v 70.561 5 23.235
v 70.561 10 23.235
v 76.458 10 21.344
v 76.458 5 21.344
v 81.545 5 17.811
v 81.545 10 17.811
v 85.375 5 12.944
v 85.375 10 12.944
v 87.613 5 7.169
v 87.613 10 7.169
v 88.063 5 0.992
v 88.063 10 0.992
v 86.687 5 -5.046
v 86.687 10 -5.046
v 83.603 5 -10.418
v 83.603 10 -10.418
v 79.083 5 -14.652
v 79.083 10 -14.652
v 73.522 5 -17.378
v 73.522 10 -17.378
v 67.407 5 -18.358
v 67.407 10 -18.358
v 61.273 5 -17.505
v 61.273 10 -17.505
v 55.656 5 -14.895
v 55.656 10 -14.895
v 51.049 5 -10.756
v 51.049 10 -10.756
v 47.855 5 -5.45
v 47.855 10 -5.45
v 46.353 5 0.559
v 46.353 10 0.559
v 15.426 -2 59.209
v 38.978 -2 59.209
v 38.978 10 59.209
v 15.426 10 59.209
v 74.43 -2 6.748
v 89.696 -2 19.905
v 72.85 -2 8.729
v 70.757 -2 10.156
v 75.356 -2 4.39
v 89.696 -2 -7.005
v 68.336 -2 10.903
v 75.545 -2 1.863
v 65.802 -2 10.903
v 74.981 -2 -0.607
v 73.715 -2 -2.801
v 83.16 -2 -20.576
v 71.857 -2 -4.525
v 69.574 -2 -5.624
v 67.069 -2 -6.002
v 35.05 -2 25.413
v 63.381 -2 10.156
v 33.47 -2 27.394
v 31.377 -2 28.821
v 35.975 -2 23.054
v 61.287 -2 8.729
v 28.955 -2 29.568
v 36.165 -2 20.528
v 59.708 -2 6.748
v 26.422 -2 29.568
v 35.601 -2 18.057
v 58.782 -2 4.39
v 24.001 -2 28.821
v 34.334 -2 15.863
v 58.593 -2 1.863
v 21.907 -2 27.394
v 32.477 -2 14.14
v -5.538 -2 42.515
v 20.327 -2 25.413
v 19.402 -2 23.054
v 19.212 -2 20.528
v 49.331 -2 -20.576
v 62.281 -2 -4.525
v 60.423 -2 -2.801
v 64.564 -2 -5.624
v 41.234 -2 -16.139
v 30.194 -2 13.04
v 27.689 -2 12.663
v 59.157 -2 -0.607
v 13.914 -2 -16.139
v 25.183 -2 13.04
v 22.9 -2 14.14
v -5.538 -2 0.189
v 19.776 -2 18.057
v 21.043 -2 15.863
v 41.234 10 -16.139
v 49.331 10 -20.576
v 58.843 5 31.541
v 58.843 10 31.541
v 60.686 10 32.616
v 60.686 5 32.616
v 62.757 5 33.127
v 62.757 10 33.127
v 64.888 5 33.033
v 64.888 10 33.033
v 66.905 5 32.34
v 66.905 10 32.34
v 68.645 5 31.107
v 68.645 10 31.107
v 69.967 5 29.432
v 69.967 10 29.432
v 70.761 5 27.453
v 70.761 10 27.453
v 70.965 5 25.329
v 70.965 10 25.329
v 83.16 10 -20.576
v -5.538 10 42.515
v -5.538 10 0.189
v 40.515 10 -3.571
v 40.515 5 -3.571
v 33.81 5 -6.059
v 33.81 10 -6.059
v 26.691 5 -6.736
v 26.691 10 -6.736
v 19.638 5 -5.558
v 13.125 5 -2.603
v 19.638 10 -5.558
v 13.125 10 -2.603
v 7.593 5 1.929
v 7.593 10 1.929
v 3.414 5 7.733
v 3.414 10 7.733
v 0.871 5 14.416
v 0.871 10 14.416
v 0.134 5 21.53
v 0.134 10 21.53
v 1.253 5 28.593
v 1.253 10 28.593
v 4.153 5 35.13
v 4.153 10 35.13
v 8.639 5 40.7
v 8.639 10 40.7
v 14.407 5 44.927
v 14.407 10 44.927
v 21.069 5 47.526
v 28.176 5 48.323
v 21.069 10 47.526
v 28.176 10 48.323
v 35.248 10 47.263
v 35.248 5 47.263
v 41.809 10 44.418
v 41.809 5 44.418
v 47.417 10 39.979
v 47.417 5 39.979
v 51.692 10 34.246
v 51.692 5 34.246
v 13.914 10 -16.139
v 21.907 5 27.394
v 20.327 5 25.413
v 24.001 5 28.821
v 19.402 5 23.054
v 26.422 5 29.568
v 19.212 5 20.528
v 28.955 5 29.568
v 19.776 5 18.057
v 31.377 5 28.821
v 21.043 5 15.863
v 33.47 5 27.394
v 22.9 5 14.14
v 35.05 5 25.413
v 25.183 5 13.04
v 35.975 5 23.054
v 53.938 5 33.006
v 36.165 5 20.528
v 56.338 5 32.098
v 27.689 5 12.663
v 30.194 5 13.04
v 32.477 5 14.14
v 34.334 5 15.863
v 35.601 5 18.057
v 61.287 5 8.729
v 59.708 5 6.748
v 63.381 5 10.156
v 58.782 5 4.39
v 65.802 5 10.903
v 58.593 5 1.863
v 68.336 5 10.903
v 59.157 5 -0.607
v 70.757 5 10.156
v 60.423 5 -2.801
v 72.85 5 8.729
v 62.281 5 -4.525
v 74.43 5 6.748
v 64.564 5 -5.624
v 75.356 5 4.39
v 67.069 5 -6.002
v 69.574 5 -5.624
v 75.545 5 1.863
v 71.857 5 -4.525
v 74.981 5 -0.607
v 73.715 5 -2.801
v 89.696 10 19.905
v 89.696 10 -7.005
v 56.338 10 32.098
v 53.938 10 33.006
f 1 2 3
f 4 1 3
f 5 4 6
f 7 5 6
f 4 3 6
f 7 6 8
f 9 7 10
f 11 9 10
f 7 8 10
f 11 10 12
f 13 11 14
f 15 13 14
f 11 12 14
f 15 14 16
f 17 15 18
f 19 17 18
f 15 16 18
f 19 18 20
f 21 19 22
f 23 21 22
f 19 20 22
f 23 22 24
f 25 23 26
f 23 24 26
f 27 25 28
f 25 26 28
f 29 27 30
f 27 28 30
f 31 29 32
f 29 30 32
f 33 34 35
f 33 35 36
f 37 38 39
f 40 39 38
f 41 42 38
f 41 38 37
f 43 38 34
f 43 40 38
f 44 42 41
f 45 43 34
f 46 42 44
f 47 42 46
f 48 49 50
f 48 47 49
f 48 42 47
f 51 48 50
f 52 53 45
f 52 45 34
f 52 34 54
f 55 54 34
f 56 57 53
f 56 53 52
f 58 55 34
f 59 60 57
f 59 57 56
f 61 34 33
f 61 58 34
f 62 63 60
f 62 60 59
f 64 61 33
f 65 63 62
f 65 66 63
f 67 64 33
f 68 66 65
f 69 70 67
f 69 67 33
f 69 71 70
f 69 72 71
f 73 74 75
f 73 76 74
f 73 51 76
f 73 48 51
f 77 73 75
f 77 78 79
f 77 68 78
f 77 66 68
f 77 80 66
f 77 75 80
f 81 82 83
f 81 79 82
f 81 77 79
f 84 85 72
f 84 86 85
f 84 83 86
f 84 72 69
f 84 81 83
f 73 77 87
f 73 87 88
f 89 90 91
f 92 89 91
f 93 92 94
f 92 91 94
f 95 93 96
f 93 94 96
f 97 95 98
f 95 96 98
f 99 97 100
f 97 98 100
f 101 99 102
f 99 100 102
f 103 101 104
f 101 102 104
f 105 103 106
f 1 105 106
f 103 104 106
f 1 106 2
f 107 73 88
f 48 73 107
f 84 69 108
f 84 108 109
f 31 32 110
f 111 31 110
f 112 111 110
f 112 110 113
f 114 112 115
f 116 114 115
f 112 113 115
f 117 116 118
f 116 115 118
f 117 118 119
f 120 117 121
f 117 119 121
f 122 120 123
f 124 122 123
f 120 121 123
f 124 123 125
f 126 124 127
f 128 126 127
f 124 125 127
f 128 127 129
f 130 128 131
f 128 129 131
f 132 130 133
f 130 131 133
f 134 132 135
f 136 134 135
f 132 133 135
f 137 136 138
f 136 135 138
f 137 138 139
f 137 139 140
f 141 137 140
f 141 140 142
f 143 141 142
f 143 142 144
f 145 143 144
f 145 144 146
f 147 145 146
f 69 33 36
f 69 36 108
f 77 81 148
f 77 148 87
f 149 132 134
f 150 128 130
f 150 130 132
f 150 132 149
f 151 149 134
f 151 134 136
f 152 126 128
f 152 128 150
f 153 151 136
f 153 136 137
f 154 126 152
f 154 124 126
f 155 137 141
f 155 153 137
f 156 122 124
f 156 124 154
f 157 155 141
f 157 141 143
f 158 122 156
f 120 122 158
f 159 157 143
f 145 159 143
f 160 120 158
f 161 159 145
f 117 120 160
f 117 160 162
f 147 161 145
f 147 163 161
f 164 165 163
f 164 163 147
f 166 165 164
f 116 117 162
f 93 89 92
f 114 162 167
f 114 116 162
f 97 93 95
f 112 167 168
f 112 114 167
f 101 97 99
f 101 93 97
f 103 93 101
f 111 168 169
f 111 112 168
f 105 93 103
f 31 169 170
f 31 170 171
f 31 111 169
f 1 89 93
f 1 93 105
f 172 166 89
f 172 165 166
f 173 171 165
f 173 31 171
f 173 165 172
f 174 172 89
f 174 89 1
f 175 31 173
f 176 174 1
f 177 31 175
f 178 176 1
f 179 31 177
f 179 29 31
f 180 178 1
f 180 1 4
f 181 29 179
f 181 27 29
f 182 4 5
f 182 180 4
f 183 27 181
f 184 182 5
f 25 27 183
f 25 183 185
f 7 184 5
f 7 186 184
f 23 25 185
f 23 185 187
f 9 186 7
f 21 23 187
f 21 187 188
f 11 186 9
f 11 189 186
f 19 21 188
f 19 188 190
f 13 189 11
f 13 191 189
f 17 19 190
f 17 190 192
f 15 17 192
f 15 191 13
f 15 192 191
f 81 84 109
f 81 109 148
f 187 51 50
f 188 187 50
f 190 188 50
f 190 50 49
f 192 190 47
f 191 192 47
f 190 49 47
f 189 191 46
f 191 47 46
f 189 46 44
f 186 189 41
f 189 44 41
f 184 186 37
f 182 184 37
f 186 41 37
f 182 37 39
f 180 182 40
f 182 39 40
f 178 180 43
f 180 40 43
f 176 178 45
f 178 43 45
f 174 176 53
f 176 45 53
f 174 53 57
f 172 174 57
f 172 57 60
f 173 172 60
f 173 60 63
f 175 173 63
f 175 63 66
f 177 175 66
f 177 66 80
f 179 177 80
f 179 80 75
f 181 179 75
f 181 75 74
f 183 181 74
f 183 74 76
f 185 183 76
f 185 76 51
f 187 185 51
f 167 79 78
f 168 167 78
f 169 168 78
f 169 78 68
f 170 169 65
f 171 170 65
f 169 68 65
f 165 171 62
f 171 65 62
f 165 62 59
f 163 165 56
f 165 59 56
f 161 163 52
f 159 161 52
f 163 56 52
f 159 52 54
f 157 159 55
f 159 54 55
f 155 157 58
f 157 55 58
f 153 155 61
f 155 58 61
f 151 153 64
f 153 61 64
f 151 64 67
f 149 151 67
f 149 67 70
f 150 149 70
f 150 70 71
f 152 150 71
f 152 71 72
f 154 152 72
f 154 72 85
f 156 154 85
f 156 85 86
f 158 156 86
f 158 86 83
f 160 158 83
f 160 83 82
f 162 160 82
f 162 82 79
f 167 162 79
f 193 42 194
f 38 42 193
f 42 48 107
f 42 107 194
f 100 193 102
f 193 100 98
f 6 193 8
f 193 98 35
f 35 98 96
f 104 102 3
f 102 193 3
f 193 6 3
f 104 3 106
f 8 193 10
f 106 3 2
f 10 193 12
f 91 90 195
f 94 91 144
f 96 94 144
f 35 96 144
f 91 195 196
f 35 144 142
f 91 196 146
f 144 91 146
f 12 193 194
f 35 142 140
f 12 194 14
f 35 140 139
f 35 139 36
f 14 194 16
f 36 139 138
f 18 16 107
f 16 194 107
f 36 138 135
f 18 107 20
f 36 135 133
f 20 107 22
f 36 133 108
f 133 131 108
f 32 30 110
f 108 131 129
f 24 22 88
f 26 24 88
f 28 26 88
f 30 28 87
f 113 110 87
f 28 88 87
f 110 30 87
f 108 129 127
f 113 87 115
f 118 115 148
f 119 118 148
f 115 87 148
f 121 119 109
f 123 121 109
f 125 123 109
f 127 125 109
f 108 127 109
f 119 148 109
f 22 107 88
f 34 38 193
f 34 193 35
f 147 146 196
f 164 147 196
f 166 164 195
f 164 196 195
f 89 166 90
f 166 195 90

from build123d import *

# Parameters (mm, degrees)
EXTRUDE_START       = -2
EXTRUDE_1_DEPTH     = 12
CUT_EXTRUDE_1_DEPTH = 5
SKETCH_4_R          = 8.5
CUT_EXTRUDE_2_DEPTH = 109.143461437


with BuildPart() as part:
    # Эскиз1 → Вытянуть1 (new body)
    with BuildSketch(Plane(origin=(0, 0, 0), x_dir=(1, 0, 0), z_dir=(0, 1, 0)).offset(EXTRUDE_START)):
        Polygon((41.234335961, 16.139303033), (49.33132622, 20.576367476), (83.159652077, 20.576367476), (89.695898477, 7.004834382), (89.695898477, -19.904859962), (38.978411799, -59.208563976), (15.42620007, -59.208563976), (-5.538491663, -42.514725177), (-5.538491663, -0.189156064), (13.914350861, 16.139303033), align=None)
    extrude(amount=EXTRUDE_1_DEPTH)

    # Эскиз2 → Вырез-Вытянуть1 (cut)
    with BuildSketch(Plane(origin=(0, 10, 0), x_dir=(1, 0, 0), z_dir=(0, 1, 0))):
        with BuildLine():
            ThreePointArc((46.353434454, -0.558740061), (0.463282904, -25.097768311), (51.691914237, -34.246388345))
            ThreePointArc((51.691914237, -34.246388345), (55.121981017, -32.508830766), (58.84329247, -31.541201954))
            ThreePointArc((58.84329247, -31.541201954), (67.819533531, -31.785998768), (70.560678986, -23.235036795))
            ThreePointArc((70.560678986, -23.235036795), (81.500890347, 12.702706564), (46.353434454, -0.558740061))
        make_face()
    extrude(amount=-CUT_EXTRUDE_1_DEPTH, mode=Mode.SUBTRACT)

    # Эскиз4 → Вырез-Вытянуть2 (cut, through all)
    with BuildSketch(Plane.XZ.offset(2)):
        with Locations(Location((27.688571463, 21.162784436, 0), (0, 0, 270))):
            Circle(SKETCH_4_R)
        with Locations(Location((67.068947784, 2.498184147, 0), (0, 0, 270))):
            Circle(SKETCH_4_R)
    extrude(amount=-CUT_EXTRUDE_2_DEPTH, mode=Mode.SUBTRACT)


solid = part.part
